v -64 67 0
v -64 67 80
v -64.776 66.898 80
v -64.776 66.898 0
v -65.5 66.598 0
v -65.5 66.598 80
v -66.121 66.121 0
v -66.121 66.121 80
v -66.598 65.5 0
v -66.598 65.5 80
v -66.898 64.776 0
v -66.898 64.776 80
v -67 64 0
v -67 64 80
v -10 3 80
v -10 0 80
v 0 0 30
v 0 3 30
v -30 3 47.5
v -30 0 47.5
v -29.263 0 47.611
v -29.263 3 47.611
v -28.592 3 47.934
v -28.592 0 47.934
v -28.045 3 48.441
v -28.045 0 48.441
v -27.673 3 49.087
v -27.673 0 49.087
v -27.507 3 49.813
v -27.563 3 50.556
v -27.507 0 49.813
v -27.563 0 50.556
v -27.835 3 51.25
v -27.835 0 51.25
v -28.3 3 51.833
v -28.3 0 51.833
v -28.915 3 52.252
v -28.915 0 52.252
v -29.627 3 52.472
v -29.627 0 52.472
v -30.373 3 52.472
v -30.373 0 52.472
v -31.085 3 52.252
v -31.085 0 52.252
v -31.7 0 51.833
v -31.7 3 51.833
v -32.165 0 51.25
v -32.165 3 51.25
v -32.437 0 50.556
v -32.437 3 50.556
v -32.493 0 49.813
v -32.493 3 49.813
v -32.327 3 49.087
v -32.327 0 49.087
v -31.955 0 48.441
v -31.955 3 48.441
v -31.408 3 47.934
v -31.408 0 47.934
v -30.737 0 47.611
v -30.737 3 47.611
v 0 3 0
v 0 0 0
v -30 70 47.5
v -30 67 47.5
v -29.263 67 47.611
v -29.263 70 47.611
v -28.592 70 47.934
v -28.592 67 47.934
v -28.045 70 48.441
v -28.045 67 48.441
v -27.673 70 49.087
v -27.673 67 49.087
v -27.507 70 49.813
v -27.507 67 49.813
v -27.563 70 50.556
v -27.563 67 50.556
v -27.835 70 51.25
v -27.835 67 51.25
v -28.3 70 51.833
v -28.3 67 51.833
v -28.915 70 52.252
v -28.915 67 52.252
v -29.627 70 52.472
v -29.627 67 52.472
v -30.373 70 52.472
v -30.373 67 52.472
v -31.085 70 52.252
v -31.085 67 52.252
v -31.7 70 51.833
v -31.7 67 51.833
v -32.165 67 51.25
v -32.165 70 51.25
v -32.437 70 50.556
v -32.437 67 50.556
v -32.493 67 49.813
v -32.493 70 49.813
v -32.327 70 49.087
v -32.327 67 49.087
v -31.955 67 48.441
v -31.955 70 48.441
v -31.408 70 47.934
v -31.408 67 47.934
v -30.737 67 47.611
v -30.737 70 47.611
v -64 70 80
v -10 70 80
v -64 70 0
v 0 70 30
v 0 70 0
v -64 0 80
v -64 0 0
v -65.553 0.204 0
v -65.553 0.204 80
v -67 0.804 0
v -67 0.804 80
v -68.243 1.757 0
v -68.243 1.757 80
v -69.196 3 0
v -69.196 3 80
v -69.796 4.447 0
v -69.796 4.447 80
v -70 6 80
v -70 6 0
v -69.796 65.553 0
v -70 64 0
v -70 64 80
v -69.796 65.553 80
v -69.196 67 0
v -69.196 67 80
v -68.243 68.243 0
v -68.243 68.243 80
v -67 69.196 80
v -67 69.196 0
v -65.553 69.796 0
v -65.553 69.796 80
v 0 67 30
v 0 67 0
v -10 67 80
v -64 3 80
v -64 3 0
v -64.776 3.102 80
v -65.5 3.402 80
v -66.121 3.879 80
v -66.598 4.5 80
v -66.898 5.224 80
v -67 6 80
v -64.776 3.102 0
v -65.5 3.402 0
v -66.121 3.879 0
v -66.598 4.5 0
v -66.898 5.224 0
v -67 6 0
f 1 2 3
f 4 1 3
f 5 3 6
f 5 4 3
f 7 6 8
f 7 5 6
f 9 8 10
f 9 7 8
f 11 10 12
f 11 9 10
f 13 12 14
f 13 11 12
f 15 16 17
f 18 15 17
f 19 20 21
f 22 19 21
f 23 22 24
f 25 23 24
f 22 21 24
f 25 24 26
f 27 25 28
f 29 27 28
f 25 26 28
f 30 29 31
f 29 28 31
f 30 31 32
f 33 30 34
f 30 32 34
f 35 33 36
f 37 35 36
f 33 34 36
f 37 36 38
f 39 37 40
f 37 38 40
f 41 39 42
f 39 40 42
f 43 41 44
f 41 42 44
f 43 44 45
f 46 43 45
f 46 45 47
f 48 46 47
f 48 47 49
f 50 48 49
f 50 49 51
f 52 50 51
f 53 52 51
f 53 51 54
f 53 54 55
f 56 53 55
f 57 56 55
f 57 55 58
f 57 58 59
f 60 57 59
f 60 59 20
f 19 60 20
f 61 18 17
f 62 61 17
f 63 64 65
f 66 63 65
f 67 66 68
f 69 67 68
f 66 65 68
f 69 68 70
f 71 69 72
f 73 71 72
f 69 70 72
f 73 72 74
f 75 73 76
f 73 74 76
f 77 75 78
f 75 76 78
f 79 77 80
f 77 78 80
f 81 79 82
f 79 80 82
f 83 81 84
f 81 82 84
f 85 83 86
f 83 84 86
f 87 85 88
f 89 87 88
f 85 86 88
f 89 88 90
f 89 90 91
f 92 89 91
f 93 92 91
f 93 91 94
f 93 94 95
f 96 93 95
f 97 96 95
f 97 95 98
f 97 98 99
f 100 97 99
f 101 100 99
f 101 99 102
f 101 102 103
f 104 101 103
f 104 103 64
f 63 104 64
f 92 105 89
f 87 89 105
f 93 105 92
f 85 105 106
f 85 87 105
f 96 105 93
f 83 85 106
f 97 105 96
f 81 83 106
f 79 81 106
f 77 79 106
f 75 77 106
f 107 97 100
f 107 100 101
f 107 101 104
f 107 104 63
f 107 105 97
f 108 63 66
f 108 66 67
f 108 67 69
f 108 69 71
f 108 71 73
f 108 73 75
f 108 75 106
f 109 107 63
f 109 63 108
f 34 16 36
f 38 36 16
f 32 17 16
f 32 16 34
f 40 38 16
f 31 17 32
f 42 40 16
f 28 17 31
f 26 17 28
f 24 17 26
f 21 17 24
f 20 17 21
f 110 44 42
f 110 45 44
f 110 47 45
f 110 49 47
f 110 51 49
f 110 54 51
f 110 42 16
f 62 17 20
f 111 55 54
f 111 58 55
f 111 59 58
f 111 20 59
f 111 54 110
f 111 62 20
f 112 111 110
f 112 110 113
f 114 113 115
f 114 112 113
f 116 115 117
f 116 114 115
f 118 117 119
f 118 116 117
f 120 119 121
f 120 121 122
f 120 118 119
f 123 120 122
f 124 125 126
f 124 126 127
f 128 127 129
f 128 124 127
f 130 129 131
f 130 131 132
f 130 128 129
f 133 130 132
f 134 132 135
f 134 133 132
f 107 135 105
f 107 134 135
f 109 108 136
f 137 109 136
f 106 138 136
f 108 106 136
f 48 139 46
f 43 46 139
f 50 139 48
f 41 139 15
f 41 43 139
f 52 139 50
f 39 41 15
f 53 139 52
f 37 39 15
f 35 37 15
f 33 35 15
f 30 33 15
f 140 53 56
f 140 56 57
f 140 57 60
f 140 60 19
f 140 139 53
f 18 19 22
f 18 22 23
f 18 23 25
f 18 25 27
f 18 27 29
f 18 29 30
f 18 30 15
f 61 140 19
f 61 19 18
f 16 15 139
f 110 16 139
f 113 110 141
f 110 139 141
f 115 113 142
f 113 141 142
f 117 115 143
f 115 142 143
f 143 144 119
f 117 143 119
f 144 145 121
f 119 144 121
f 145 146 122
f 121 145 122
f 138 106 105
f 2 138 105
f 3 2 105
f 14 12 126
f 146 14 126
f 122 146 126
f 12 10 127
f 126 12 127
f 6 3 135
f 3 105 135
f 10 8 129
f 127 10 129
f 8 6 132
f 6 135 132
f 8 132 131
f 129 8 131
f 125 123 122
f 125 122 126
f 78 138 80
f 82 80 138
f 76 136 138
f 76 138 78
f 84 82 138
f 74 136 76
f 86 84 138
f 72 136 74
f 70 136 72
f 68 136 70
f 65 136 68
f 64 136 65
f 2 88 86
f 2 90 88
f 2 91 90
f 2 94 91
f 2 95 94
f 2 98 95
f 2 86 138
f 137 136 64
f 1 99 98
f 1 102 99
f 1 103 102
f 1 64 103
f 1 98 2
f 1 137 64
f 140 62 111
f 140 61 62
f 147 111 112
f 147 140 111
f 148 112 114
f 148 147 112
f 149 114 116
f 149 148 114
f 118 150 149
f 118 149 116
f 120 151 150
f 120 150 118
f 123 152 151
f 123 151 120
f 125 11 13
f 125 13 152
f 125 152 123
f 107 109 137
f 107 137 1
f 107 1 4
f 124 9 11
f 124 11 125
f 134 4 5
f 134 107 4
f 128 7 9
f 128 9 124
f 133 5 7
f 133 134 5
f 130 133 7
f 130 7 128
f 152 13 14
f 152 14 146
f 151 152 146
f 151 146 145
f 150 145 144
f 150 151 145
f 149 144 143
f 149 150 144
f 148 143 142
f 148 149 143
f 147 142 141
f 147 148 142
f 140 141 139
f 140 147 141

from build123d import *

# Parameters (mm, degrees)
BASE_FLANGE1_DEPTH = 80
CUT_EXTRUDE1_DEPTH = 158
SKETCH7_R          = 2.5
CUT_EXTRUDE2_DEPTH = 158


# Sheet-metal steps are written as plain solids
with BuildPart() as part:
    # Sketch1 → Base-Flange1 (new body)
    with BuildSketch(Plane.XY):
        with BuildLine():
            Line((0, 0), (-64, 0))
            ThreePointArc((-64, 0), (-68.242640687, 1.757359313), (-70, 6))
            Line((-70, 6), (-70, 64))
            ThreePointArc((-70, 64), (-68.242640687, 68.242640687), (-64, 70))
            Line((-64, 70), (0, 70))
            Line((0, 70), (0, 67))
            Line((0, 67), (-64, 67))
            ThreePointArc((-64, 67), (-66.121320344, 66.121320344), (-67, 64))
            Line((-67, 64), (-67, 6))
            ThreePointArc((-67, 6), (-66.121320344, 3.878679656), (-64, 3))
            Line((-64, 3), (0, 3))
            Line((0, 3), (0, 0))
        make_face()
    extrude(amount=BASE_FLANGE1_DEPTH)

    # Sketch6 → Cut-Extrude1 (cut)
    with BuildSketch(Plane.XZ):
        Polygon((0, 80), (-10, 80), (0, 30), align=None)
    extrude(amount=-CUT_EXTRUDE1_DEPTH, mode=Mode.SUBTRACT)

    # Sketch7 → Cut-Extrude2 (cut)
    with BuildSketch(Plane.XZ):
        with Locations(Location((-30, 50, 0), (0, 0, 270))):
            Circle(SKETCH7_R)
    extrude(amount=-CUT_EXTRUDE2_DEPTH, mode=Mode.SUBTRACT)


solid = part.part
